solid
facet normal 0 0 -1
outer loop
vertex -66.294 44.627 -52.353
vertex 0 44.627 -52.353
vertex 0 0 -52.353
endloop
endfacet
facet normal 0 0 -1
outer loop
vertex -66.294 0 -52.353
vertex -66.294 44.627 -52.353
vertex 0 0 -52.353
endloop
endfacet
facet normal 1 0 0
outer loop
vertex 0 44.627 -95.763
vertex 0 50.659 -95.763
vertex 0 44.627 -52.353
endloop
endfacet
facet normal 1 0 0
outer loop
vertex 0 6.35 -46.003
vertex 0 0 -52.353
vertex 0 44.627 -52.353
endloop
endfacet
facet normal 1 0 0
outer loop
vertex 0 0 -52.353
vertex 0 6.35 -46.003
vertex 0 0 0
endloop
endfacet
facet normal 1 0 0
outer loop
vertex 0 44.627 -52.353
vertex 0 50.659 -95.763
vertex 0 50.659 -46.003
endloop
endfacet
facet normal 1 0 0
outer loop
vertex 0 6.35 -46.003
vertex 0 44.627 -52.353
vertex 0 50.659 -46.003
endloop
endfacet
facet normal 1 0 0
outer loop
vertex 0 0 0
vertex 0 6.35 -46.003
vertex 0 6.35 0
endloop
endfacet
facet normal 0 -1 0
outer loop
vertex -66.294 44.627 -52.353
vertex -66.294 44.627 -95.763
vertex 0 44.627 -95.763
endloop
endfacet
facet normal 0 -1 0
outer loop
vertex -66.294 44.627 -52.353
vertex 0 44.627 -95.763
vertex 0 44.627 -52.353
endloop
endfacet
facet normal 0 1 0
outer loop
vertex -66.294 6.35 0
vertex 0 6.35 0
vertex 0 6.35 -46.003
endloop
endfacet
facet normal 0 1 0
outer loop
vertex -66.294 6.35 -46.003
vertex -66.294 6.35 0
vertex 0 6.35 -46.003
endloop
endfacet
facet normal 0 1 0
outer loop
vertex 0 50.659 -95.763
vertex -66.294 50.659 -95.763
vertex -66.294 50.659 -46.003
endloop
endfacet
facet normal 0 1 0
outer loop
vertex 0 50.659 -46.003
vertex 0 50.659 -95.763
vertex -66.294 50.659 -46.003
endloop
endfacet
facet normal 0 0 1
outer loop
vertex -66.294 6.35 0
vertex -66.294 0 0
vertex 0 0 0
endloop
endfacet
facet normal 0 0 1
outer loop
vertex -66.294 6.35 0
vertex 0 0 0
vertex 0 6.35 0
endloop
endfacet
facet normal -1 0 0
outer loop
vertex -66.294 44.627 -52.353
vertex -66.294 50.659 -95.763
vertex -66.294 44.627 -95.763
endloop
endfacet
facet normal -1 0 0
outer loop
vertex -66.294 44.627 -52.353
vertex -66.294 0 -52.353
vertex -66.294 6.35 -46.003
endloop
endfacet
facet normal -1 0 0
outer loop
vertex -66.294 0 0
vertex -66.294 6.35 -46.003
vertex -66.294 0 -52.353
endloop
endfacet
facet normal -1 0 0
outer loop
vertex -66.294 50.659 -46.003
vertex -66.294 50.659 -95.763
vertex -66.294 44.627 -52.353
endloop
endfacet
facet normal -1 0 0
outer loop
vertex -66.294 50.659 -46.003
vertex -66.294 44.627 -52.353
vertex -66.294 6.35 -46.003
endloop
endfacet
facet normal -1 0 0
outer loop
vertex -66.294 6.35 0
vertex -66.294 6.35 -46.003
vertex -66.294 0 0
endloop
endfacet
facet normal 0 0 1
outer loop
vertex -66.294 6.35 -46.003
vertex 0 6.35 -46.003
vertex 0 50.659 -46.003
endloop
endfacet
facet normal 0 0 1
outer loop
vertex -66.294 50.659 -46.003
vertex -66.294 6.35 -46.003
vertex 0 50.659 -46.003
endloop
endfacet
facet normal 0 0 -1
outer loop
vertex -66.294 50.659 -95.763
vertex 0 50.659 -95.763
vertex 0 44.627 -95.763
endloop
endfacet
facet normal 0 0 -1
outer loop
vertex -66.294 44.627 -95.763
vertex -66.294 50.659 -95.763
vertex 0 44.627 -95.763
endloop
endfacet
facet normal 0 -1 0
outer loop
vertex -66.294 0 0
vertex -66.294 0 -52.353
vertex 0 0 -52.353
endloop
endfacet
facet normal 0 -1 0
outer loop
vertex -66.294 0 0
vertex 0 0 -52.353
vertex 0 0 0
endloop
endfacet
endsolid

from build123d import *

# Parameters (mm, degrees)
EXTRUDE4_DEPTH = 66.294


with BuildPart() as part:
    # Sketch10 → Extrude4 (new body)
    with BuildSketch(Plane(origin=(0, 0, 0), x_dir=(0, 0, -1), z_dir=(1, 0, 0))):
        Polygon((52.353300196, 44.627176404), (52.353300196, 0), (0, 0), (0, 6.35), (46.003300196, 6.35), (46.003300196, 50.658753449), (52.353300196, 50.658753449), (95.762817201, 50.658753449), (95.762817201, 44.627176404), align=None)
    extrude(amount=-EXTRUDE4_DEPTH)


solid = part.part
